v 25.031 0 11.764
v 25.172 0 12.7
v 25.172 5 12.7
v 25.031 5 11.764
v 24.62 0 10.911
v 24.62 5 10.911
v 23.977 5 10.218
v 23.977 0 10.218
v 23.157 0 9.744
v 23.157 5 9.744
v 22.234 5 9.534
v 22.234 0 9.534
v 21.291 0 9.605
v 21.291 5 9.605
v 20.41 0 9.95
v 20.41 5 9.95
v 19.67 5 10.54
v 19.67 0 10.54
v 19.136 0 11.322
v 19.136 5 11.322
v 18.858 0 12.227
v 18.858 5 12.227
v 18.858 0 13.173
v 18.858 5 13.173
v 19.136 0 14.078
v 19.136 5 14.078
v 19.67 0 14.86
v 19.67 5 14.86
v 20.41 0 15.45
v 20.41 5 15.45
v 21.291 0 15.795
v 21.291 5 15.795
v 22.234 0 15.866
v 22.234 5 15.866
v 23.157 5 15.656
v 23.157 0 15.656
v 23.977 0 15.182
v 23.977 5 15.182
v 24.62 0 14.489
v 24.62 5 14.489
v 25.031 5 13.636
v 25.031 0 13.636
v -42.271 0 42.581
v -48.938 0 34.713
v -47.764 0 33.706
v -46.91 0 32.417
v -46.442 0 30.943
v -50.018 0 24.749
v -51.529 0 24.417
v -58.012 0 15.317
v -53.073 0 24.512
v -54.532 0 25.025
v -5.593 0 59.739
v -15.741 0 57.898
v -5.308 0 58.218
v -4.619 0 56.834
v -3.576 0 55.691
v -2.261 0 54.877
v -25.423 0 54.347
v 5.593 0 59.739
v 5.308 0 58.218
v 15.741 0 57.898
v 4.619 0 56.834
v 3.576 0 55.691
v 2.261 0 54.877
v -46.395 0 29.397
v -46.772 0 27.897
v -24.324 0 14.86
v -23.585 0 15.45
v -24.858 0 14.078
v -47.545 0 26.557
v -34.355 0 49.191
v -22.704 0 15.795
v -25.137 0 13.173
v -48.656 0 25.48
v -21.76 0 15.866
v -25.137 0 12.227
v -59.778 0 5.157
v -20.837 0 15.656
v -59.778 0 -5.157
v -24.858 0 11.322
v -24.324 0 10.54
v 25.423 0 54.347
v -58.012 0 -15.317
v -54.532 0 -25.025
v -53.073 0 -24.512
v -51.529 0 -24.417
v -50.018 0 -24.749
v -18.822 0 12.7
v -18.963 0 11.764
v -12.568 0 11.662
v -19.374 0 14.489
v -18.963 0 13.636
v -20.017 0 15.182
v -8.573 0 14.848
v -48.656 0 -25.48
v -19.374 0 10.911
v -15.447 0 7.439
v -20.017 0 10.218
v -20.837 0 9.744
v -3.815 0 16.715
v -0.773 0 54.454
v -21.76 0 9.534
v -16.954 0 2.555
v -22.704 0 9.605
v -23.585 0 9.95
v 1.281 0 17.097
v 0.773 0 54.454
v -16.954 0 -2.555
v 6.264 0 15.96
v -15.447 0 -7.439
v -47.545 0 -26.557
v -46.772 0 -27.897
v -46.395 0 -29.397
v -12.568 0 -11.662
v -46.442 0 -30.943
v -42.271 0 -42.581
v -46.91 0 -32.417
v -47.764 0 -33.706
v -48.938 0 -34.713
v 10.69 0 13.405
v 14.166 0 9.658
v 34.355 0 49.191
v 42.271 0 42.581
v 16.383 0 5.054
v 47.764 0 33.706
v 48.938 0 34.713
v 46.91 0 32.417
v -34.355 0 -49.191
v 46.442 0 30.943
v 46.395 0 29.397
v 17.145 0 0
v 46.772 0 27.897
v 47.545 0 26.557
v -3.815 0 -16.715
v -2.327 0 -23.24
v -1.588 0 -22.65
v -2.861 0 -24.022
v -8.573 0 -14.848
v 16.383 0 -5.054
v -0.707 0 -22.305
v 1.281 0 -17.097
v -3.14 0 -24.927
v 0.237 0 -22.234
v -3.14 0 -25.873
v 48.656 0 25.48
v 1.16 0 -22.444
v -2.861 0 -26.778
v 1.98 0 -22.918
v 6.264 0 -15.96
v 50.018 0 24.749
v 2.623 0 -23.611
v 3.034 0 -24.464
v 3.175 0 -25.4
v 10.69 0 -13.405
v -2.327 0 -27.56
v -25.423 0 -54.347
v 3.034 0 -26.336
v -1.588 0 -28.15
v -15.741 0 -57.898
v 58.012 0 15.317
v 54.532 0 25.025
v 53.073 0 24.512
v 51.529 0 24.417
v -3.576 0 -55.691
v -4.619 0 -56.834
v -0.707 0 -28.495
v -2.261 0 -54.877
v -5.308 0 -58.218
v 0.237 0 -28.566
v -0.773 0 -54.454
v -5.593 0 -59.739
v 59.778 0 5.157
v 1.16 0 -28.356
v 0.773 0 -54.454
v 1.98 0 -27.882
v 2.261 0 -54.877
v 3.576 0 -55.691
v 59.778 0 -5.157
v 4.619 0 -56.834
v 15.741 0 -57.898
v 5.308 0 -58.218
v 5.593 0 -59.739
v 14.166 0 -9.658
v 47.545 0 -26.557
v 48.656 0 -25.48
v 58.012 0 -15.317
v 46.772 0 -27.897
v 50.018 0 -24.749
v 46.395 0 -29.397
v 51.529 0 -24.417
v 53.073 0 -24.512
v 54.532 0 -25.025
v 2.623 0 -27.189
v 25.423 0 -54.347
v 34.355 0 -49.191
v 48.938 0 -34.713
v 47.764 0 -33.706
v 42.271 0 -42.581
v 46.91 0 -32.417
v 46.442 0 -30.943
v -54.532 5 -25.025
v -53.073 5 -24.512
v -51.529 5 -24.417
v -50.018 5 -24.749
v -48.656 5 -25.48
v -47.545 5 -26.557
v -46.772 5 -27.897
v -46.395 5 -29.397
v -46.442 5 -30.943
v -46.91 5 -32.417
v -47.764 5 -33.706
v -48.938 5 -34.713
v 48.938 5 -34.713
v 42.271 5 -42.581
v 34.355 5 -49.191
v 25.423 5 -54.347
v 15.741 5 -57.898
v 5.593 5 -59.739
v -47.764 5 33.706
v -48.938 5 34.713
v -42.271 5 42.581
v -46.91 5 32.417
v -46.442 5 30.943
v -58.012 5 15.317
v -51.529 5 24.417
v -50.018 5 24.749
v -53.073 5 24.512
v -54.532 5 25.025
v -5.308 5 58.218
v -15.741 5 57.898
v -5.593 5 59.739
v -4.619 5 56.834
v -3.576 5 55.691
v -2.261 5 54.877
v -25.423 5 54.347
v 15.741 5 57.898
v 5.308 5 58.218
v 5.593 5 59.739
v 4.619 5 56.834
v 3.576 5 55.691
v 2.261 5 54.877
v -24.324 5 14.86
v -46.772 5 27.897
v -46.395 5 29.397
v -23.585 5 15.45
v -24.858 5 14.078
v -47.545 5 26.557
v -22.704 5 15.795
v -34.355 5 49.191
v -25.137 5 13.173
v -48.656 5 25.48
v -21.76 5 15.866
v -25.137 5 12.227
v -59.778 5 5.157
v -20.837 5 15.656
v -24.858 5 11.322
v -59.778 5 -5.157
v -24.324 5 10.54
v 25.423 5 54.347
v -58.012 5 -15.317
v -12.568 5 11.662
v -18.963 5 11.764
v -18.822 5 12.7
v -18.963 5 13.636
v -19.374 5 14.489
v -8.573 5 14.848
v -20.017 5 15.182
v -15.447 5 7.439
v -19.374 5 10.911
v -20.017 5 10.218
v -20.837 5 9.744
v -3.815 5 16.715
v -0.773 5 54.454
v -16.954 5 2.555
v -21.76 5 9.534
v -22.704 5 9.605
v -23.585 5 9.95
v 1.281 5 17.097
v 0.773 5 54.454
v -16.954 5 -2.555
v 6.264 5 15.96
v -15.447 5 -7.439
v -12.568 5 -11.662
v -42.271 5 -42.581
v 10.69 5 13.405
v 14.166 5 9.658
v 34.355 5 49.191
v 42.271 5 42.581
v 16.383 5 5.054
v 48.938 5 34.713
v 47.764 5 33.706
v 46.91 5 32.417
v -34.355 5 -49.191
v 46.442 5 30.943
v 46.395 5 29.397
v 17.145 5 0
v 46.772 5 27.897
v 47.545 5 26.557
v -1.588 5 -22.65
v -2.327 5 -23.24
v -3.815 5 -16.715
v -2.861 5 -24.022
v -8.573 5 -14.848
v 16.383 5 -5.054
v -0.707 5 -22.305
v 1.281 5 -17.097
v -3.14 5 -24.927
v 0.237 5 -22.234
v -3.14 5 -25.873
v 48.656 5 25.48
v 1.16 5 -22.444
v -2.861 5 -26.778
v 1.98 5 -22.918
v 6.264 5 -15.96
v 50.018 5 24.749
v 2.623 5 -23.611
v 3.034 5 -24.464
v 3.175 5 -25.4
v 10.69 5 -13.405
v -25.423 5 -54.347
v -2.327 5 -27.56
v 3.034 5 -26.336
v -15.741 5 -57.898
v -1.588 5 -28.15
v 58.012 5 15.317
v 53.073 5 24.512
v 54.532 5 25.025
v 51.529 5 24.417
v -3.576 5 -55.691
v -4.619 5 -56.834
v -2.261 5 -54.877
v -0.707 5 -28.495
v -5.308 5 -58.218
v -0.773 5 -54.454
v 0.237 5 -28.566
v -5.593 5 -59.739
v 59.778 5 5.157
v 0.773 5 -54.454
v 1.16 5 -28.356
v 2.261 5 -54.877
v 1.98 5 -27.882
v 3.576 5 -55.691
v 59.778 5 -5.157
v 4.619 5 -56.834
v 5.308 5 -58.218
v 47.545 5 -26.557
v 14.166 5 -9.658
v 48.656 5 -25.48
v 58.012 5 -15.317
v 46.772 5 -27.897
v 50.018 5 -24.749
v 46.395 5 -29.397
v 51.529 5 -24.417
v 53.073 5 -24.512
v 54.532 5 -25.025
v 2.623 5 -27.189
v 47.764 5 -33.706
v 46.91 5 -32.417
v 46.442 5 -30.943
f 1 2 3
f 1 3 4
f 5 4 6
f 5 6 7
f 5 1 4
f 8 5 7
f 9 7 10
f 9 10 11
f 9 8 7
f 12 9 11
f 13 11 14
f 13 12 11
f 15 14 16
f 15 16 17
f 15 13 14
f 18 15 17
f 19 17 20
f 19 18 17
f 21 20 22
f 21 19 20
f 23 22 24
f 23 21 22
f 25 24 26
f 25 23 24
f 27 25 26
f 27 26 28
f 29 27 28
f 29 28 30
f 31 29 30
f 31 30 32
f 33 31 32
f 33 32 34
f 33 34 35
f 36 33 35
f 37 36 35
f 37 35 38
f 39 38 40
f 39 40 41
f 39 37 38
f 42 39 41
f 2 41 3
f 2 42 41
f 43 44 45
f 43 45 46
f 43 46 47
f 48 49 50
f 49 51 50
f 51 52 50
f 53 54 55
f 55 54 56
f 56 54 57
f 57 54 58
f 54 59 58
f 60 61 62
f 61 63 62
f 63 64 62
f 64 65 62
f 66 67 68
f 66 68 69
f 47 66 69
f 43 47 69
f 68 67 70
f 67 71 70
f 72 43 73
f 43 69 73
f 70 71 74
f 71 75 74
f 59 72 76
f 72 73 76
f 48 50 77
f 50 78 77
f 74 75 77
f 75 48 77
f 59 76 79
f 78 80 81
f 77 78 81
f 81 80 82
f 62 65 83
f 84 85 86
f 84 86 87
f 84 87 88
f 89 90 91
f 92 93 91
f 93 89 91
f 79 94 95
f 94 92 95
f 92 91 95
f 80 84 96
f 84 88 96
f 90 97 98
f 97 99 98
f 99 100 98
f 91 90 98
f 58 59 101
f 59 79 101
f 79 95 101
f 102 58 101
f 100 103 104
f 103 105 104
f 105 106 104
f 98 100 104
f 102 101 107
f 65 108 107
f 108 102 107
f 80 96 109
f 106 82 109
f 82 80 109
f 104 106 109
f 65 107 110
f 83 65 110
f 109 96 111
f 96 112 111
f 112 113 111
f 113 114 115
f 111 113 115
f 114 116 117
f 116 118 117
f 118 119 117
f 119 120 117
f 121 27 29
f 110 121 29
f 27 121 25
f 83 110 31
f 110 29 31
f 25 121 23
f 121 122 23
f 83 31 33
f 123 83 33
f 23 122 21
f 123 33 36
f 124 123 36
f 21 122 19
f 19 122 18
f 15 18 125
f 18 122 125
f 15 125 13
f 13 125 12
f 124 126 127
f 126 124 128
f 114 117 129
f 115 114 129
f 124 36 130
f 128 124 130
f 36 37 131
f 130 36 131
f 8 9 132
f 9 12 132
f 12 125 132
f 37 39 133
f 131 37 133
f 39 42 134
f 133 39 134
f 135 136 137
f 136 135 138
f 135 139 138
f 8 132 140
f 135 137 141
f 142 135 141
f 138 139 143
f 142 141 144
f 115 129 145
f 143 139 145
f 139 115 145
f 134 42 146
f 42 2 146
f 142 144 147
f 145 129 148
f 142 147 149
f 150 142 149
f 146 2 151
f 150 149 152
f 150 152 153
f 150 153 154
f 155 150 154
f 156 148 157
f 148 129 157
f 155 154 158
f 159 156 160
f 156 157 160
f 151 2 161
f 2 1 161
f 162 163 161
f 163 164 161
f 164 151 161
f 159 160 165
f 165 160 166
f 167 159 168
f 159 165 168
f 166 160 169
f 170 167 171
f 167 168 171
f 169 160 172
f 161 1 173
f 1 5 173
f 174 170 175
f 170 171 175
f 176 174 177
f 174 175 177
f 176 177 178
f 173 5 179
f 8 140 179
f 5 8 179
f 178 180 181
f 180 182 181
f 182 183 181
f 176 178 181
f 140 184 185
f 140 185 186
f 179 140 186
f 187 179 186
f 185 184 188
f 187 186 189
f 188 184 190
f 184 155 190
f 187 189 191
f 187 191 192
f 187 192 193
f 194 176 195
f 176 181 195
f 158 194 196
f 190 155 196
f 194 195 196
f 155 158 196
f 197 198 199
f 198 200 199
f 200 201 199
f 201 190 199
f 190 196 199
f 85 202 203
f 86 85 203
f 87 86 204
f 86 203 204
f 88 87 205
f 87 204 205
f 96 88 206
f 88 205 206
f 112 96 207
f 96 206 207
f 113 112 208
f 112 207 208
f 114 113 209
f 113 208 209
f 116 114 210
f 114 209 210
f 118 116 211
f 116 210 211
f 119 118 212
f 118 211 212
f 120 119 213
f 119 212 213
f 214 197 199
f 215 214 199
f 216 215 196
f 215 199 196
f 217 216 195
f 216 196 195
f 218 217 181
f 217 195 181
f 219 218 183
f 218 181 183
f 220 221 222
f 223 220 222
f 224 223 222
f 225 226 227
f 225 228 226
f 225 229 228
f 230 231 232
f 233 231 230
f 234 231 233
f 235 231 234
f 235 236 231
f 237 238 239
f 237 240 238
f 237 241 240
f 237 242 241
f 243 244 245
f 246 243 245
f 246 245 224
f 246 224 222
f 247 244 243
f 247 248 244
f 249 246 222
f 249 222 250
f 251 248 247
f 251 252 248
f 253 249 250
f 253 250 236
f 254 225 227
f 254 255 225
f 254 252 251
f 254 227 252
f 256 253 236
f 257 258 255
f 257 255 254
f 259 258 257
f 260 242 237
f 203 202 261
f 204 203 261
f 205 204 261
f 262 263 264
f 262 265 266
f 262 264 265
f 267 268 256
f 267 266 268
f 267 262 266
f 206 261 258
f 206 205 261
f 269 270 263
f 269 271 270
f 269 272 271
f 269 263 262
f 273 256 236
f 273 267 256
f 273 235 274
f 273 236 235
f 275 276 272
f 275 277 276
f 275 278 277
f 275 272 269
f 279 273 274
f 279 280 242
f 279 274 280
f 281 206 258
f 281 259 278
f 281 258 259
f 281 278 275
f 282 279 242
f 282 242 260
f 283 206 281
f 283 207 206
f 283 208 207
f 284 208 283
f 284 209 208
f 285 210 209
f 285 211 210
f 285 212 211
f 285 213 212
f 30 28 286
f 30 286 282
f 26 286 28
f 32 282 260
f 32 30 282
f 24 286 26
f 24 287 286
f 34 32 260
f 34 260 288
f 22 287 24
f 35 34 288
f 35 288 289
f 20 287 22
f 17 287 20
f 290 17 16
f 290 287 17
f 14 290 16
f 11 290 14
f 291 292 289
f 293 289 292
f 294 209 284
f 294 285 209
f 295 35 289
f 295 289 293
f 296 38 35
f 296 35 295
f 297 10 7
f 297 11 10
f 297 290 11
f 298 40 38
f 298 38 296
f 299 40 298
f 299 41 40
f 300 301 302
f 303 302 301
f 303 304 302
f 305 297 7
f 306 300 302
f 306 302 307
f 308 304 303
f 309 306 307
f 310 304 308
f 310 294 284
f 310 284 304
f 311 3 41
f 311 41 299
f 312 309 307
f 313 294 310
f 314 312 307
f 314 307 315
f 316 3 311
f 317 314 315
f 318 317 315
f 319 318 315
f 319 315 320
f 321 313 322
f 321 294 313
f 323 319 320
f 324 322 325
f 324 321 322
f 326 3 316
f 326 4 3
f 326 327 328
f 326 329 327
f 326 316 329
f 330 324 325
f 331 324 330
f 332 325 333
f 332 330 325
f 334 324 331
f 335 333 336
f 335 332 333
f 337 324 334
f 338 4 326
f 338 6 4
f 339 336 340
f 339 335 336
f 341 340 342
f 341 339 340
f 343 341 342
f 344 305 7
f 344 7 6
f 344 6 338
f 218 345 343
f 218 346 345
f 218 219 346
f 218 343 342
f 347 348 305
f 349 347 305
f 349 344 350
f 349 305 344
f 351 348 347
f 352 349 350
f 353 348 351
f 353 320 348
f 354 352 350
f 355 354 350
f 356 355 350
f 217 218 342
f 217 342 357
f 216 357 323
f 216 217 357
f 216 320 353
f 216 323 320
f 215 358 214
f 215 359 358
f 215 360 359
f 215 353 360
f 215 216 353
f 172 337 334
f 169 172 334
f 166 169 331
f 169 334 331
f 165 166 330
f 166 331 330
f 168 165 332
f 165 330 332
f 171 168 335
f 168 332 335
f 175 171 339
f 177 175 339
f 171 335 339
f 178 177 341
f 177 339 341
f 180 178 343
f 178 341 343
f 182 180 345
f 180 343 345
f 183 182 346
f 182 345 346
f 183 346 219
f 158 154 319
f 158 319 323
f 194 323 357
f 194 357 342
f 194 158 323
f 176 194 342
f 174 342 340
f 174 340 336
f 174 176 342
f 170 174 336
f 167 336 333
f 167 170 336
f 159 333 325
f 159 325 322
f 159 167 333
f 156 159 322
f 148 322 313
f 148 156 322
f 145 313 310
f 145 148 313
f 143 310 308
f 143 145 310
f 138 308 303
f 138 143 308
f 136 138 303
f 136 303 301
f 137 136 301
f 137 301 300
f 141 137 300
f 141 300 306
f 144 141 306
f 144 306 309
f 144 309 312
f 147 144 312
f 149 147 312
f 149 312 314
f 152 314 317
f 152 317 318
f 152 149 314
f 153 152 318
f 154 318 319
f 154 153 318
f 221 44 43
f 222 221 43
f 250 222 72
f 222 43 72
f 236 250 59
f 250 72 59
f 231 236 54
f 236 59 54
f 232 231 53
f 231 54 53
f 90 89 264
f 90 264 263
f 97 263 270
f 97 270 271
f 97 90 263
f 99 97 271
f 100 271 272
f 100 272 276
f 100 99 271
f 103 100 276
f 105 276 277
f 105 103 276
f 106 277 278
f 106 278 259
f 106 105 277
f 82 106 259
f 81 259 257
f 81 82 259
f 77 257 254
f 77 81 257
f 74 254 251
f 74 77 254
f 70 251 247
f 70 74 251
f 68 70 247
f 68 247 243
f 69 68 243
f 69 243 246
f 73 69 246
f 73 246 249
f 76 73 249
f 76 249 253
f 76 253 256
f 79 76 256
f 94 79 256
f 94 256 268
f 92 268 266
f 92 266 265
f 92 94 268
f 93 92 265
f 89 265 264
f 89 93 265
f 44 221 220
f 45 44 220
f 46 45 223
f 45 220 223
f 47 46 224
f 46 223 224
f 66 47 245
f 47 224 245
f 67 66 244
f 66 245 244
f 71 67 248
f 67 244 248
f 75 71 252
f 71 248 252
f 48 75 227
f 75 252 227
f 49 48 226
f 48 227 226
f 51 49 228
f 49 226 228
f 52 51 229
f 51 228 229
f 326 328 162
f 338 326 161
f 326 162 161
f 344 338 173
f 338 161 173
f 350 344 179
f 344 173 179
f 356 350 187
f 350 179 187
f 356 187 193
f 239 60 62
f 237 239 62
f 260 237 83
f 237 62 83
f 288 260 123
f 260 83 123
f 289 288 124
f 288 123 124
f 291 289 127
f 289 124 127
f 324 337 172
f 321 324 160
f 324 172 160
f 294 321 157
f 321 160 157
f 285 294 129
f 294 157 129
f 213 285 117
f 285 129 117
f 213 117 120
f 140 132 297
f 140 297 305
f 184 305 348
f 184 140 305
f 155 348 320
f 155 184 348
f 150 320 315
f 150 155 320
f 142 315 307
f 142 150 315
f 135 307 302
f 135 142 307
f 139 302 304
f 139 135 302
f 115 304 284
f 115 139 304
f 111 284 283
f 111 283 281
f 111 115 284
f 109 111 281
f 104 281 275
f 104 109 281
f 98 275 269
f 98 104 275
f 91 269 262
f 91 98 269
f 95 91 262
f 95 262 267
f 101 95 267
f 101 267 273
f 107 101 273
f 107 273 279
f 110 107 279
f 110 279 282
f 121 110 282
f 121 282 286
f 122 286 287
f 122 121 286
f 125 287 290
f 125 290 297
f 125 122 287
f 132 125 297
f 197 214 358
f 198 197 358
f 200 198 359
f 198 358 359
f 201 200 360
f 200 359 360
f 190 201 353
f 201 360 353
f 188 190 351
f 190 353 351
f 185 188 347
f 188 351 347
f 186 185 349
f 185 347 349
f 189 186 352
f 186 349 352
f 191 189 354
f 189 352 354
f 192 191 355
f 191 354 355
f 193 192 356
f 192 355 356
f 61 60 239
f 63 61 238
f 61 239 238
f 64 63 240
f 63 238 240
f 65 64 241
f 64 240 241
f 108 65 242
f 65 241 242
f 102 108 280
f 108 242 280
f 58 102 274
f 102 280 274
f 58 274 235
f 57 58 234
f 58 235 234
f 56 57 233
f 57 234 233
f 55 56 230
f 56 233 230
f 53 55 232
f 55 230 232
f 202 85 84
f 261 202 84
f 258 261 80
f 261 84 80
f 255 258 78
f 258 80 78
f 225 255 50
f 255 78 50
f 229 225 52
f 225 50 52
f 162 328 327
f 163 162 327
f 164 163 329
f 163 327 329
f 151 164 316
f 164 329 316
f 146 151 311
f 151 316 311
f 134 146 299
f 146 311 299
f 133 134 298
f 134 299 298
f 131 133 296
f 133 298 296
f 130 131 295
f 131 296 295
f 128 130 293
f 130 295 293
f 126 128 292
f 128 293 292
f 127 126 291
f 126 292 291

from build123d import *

# Parameters (mm, degrees)
SKETCH1_R           = 59.99988
SKETCH1_R_2         = 17.145
SKETCH1_R_3         = 3.175
BOSS_EXTRUDE1_DEPTH = 5
SKETCH2_R           = 5.59943
CUT_EXTRUDE1_DEPTH  = 6
CIRPATTERN1_COUNT   = 6


with BuildPart() as part:
    # Sketch1 → Boss-Extrude1 (new body)
    with BuildSketch(Plane(origin=(0, 0, 0), x_dir=(1, 0, 0), z_dir=(0, 1, 0))):
        Circle(SKETCH1_R)
        Circle(SKETCH1_R_2, mode=Mode.SUBTRACT)
        with Locations((21.997045256, -12.7)):
            Circle(SKETCH1_R_3, mode=Mode.SUBTRACT)
        with Locations((0, 25.4)):
            Circle(SKETCH1_R_3, mode=Mode.SUBTRACT)
        with Locations((-21.997045256, -12.7)):
            Circle(SKETCH1_R_3, mode=Mode.SUBTRACT)
    extrude(amount=BOSS_EXTRUDE1_DEPTH)

    # Sketch2 → Cut-Extrude1 (cut, through all)
    with BuildSketch(Plane(origin=(0, 5, 0), x_dir=(1, 0, 0), z_dir=(0, 1, 0))):
        with Locations((0, 59.99988)):
            Circle(SKETCH2_R)
    cut_extrude1 = extrude(amount=-CUT_EXTRUDE1_DEPTH, mode=Mode.SUBTRACT)

    # CirPattern1: Cut-Extrude1 ×6 about axis
    cirpattern1_axis = Axis((0, 0, 0), (0, 1, 0))
    for i in range(1, CIRPATTERN1_COUNT):
        add(cut_extrude1.rotate(cirpattern1_axis, i * 360 / CIRPATTERN1_COUNT), mode=Mode.SUBTRACT)


solid = part.part
